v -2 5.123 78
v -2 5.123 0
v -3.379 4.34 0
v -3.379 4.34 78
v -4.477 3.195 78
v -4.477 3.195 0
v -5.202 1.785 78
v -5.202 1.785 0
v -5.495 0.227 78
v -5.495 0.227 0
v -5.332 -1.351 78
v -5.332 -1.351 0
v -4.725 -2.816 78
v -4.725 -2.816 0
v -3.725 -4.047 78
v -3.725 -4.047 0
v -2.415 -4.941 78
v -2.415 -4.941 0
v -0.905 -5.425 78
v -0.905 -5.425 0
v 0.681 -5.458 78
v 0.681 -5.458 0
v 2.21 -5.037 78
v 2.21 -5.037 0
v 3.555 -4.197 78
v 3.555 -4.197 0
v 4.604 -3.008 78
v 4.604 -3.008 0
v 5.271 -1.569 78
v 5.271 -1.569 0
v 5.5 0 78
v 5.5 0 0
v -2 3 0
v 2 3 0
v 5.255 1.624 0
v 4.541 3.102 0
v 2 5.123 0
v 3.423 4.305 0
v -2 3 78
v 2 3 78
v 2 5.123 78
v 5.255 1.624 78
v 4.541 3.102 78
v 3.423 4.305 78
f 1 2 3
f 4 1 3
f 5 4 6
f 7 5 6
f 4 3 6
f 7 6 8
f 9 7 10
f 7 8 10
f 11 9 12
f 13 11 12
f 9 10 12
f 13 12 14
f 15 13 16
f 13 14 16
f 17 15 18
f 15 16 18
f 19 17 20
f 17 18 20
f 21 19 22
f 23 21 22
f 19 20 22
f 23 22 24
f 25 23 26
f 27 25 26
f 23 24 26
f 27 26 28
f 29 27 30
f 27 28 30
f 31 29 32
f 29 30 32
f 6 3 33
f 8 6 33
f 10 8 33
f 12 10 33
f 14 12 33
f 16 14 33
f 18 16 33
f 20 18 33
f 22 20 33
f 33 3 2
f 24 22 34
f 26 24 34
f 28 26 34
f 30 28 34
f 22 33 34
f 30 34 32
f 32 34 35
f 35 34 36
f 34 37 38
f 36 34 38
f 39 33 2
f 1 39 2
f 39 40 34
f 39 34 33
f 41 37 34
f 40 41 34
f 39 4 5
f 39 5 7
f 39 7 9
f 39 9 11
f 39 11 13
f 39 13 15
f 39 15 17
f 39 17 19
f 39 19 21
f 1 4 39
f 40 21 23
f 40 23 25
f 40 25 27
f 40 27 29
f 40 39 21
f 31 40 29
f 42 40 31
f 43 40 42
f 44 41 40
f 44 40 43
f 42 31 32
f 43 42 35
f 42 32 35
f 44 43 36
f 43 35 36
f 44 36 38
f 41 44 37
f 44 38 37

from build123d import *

# Parameters (mm, degrees)
BOSS_EXTRUDE1_DEPTH = 78


with BuildPart() as part:
    # Sketch1 → Boss-Extrude1 (new body)
    with BuildSketch(Plane.XY):
        with BuildLine():
            Line((-2, 3), (-2, 5.123475383))
            ThreePointArc((-2, 5.123475383), (-3.102418411, -4.541475531), (5.5, 0))
            ThreePointArc((5.5, 0), (4.541475531, 3.102418411), (2, 5.123475383))
            Line((2, 5.123475383), (2, 3))
            Line((2, 3), (-2, 3))
        make_face()
    extrude(amount=BOSS_EXTRUDE1_DEPTH)


solid = part.part
